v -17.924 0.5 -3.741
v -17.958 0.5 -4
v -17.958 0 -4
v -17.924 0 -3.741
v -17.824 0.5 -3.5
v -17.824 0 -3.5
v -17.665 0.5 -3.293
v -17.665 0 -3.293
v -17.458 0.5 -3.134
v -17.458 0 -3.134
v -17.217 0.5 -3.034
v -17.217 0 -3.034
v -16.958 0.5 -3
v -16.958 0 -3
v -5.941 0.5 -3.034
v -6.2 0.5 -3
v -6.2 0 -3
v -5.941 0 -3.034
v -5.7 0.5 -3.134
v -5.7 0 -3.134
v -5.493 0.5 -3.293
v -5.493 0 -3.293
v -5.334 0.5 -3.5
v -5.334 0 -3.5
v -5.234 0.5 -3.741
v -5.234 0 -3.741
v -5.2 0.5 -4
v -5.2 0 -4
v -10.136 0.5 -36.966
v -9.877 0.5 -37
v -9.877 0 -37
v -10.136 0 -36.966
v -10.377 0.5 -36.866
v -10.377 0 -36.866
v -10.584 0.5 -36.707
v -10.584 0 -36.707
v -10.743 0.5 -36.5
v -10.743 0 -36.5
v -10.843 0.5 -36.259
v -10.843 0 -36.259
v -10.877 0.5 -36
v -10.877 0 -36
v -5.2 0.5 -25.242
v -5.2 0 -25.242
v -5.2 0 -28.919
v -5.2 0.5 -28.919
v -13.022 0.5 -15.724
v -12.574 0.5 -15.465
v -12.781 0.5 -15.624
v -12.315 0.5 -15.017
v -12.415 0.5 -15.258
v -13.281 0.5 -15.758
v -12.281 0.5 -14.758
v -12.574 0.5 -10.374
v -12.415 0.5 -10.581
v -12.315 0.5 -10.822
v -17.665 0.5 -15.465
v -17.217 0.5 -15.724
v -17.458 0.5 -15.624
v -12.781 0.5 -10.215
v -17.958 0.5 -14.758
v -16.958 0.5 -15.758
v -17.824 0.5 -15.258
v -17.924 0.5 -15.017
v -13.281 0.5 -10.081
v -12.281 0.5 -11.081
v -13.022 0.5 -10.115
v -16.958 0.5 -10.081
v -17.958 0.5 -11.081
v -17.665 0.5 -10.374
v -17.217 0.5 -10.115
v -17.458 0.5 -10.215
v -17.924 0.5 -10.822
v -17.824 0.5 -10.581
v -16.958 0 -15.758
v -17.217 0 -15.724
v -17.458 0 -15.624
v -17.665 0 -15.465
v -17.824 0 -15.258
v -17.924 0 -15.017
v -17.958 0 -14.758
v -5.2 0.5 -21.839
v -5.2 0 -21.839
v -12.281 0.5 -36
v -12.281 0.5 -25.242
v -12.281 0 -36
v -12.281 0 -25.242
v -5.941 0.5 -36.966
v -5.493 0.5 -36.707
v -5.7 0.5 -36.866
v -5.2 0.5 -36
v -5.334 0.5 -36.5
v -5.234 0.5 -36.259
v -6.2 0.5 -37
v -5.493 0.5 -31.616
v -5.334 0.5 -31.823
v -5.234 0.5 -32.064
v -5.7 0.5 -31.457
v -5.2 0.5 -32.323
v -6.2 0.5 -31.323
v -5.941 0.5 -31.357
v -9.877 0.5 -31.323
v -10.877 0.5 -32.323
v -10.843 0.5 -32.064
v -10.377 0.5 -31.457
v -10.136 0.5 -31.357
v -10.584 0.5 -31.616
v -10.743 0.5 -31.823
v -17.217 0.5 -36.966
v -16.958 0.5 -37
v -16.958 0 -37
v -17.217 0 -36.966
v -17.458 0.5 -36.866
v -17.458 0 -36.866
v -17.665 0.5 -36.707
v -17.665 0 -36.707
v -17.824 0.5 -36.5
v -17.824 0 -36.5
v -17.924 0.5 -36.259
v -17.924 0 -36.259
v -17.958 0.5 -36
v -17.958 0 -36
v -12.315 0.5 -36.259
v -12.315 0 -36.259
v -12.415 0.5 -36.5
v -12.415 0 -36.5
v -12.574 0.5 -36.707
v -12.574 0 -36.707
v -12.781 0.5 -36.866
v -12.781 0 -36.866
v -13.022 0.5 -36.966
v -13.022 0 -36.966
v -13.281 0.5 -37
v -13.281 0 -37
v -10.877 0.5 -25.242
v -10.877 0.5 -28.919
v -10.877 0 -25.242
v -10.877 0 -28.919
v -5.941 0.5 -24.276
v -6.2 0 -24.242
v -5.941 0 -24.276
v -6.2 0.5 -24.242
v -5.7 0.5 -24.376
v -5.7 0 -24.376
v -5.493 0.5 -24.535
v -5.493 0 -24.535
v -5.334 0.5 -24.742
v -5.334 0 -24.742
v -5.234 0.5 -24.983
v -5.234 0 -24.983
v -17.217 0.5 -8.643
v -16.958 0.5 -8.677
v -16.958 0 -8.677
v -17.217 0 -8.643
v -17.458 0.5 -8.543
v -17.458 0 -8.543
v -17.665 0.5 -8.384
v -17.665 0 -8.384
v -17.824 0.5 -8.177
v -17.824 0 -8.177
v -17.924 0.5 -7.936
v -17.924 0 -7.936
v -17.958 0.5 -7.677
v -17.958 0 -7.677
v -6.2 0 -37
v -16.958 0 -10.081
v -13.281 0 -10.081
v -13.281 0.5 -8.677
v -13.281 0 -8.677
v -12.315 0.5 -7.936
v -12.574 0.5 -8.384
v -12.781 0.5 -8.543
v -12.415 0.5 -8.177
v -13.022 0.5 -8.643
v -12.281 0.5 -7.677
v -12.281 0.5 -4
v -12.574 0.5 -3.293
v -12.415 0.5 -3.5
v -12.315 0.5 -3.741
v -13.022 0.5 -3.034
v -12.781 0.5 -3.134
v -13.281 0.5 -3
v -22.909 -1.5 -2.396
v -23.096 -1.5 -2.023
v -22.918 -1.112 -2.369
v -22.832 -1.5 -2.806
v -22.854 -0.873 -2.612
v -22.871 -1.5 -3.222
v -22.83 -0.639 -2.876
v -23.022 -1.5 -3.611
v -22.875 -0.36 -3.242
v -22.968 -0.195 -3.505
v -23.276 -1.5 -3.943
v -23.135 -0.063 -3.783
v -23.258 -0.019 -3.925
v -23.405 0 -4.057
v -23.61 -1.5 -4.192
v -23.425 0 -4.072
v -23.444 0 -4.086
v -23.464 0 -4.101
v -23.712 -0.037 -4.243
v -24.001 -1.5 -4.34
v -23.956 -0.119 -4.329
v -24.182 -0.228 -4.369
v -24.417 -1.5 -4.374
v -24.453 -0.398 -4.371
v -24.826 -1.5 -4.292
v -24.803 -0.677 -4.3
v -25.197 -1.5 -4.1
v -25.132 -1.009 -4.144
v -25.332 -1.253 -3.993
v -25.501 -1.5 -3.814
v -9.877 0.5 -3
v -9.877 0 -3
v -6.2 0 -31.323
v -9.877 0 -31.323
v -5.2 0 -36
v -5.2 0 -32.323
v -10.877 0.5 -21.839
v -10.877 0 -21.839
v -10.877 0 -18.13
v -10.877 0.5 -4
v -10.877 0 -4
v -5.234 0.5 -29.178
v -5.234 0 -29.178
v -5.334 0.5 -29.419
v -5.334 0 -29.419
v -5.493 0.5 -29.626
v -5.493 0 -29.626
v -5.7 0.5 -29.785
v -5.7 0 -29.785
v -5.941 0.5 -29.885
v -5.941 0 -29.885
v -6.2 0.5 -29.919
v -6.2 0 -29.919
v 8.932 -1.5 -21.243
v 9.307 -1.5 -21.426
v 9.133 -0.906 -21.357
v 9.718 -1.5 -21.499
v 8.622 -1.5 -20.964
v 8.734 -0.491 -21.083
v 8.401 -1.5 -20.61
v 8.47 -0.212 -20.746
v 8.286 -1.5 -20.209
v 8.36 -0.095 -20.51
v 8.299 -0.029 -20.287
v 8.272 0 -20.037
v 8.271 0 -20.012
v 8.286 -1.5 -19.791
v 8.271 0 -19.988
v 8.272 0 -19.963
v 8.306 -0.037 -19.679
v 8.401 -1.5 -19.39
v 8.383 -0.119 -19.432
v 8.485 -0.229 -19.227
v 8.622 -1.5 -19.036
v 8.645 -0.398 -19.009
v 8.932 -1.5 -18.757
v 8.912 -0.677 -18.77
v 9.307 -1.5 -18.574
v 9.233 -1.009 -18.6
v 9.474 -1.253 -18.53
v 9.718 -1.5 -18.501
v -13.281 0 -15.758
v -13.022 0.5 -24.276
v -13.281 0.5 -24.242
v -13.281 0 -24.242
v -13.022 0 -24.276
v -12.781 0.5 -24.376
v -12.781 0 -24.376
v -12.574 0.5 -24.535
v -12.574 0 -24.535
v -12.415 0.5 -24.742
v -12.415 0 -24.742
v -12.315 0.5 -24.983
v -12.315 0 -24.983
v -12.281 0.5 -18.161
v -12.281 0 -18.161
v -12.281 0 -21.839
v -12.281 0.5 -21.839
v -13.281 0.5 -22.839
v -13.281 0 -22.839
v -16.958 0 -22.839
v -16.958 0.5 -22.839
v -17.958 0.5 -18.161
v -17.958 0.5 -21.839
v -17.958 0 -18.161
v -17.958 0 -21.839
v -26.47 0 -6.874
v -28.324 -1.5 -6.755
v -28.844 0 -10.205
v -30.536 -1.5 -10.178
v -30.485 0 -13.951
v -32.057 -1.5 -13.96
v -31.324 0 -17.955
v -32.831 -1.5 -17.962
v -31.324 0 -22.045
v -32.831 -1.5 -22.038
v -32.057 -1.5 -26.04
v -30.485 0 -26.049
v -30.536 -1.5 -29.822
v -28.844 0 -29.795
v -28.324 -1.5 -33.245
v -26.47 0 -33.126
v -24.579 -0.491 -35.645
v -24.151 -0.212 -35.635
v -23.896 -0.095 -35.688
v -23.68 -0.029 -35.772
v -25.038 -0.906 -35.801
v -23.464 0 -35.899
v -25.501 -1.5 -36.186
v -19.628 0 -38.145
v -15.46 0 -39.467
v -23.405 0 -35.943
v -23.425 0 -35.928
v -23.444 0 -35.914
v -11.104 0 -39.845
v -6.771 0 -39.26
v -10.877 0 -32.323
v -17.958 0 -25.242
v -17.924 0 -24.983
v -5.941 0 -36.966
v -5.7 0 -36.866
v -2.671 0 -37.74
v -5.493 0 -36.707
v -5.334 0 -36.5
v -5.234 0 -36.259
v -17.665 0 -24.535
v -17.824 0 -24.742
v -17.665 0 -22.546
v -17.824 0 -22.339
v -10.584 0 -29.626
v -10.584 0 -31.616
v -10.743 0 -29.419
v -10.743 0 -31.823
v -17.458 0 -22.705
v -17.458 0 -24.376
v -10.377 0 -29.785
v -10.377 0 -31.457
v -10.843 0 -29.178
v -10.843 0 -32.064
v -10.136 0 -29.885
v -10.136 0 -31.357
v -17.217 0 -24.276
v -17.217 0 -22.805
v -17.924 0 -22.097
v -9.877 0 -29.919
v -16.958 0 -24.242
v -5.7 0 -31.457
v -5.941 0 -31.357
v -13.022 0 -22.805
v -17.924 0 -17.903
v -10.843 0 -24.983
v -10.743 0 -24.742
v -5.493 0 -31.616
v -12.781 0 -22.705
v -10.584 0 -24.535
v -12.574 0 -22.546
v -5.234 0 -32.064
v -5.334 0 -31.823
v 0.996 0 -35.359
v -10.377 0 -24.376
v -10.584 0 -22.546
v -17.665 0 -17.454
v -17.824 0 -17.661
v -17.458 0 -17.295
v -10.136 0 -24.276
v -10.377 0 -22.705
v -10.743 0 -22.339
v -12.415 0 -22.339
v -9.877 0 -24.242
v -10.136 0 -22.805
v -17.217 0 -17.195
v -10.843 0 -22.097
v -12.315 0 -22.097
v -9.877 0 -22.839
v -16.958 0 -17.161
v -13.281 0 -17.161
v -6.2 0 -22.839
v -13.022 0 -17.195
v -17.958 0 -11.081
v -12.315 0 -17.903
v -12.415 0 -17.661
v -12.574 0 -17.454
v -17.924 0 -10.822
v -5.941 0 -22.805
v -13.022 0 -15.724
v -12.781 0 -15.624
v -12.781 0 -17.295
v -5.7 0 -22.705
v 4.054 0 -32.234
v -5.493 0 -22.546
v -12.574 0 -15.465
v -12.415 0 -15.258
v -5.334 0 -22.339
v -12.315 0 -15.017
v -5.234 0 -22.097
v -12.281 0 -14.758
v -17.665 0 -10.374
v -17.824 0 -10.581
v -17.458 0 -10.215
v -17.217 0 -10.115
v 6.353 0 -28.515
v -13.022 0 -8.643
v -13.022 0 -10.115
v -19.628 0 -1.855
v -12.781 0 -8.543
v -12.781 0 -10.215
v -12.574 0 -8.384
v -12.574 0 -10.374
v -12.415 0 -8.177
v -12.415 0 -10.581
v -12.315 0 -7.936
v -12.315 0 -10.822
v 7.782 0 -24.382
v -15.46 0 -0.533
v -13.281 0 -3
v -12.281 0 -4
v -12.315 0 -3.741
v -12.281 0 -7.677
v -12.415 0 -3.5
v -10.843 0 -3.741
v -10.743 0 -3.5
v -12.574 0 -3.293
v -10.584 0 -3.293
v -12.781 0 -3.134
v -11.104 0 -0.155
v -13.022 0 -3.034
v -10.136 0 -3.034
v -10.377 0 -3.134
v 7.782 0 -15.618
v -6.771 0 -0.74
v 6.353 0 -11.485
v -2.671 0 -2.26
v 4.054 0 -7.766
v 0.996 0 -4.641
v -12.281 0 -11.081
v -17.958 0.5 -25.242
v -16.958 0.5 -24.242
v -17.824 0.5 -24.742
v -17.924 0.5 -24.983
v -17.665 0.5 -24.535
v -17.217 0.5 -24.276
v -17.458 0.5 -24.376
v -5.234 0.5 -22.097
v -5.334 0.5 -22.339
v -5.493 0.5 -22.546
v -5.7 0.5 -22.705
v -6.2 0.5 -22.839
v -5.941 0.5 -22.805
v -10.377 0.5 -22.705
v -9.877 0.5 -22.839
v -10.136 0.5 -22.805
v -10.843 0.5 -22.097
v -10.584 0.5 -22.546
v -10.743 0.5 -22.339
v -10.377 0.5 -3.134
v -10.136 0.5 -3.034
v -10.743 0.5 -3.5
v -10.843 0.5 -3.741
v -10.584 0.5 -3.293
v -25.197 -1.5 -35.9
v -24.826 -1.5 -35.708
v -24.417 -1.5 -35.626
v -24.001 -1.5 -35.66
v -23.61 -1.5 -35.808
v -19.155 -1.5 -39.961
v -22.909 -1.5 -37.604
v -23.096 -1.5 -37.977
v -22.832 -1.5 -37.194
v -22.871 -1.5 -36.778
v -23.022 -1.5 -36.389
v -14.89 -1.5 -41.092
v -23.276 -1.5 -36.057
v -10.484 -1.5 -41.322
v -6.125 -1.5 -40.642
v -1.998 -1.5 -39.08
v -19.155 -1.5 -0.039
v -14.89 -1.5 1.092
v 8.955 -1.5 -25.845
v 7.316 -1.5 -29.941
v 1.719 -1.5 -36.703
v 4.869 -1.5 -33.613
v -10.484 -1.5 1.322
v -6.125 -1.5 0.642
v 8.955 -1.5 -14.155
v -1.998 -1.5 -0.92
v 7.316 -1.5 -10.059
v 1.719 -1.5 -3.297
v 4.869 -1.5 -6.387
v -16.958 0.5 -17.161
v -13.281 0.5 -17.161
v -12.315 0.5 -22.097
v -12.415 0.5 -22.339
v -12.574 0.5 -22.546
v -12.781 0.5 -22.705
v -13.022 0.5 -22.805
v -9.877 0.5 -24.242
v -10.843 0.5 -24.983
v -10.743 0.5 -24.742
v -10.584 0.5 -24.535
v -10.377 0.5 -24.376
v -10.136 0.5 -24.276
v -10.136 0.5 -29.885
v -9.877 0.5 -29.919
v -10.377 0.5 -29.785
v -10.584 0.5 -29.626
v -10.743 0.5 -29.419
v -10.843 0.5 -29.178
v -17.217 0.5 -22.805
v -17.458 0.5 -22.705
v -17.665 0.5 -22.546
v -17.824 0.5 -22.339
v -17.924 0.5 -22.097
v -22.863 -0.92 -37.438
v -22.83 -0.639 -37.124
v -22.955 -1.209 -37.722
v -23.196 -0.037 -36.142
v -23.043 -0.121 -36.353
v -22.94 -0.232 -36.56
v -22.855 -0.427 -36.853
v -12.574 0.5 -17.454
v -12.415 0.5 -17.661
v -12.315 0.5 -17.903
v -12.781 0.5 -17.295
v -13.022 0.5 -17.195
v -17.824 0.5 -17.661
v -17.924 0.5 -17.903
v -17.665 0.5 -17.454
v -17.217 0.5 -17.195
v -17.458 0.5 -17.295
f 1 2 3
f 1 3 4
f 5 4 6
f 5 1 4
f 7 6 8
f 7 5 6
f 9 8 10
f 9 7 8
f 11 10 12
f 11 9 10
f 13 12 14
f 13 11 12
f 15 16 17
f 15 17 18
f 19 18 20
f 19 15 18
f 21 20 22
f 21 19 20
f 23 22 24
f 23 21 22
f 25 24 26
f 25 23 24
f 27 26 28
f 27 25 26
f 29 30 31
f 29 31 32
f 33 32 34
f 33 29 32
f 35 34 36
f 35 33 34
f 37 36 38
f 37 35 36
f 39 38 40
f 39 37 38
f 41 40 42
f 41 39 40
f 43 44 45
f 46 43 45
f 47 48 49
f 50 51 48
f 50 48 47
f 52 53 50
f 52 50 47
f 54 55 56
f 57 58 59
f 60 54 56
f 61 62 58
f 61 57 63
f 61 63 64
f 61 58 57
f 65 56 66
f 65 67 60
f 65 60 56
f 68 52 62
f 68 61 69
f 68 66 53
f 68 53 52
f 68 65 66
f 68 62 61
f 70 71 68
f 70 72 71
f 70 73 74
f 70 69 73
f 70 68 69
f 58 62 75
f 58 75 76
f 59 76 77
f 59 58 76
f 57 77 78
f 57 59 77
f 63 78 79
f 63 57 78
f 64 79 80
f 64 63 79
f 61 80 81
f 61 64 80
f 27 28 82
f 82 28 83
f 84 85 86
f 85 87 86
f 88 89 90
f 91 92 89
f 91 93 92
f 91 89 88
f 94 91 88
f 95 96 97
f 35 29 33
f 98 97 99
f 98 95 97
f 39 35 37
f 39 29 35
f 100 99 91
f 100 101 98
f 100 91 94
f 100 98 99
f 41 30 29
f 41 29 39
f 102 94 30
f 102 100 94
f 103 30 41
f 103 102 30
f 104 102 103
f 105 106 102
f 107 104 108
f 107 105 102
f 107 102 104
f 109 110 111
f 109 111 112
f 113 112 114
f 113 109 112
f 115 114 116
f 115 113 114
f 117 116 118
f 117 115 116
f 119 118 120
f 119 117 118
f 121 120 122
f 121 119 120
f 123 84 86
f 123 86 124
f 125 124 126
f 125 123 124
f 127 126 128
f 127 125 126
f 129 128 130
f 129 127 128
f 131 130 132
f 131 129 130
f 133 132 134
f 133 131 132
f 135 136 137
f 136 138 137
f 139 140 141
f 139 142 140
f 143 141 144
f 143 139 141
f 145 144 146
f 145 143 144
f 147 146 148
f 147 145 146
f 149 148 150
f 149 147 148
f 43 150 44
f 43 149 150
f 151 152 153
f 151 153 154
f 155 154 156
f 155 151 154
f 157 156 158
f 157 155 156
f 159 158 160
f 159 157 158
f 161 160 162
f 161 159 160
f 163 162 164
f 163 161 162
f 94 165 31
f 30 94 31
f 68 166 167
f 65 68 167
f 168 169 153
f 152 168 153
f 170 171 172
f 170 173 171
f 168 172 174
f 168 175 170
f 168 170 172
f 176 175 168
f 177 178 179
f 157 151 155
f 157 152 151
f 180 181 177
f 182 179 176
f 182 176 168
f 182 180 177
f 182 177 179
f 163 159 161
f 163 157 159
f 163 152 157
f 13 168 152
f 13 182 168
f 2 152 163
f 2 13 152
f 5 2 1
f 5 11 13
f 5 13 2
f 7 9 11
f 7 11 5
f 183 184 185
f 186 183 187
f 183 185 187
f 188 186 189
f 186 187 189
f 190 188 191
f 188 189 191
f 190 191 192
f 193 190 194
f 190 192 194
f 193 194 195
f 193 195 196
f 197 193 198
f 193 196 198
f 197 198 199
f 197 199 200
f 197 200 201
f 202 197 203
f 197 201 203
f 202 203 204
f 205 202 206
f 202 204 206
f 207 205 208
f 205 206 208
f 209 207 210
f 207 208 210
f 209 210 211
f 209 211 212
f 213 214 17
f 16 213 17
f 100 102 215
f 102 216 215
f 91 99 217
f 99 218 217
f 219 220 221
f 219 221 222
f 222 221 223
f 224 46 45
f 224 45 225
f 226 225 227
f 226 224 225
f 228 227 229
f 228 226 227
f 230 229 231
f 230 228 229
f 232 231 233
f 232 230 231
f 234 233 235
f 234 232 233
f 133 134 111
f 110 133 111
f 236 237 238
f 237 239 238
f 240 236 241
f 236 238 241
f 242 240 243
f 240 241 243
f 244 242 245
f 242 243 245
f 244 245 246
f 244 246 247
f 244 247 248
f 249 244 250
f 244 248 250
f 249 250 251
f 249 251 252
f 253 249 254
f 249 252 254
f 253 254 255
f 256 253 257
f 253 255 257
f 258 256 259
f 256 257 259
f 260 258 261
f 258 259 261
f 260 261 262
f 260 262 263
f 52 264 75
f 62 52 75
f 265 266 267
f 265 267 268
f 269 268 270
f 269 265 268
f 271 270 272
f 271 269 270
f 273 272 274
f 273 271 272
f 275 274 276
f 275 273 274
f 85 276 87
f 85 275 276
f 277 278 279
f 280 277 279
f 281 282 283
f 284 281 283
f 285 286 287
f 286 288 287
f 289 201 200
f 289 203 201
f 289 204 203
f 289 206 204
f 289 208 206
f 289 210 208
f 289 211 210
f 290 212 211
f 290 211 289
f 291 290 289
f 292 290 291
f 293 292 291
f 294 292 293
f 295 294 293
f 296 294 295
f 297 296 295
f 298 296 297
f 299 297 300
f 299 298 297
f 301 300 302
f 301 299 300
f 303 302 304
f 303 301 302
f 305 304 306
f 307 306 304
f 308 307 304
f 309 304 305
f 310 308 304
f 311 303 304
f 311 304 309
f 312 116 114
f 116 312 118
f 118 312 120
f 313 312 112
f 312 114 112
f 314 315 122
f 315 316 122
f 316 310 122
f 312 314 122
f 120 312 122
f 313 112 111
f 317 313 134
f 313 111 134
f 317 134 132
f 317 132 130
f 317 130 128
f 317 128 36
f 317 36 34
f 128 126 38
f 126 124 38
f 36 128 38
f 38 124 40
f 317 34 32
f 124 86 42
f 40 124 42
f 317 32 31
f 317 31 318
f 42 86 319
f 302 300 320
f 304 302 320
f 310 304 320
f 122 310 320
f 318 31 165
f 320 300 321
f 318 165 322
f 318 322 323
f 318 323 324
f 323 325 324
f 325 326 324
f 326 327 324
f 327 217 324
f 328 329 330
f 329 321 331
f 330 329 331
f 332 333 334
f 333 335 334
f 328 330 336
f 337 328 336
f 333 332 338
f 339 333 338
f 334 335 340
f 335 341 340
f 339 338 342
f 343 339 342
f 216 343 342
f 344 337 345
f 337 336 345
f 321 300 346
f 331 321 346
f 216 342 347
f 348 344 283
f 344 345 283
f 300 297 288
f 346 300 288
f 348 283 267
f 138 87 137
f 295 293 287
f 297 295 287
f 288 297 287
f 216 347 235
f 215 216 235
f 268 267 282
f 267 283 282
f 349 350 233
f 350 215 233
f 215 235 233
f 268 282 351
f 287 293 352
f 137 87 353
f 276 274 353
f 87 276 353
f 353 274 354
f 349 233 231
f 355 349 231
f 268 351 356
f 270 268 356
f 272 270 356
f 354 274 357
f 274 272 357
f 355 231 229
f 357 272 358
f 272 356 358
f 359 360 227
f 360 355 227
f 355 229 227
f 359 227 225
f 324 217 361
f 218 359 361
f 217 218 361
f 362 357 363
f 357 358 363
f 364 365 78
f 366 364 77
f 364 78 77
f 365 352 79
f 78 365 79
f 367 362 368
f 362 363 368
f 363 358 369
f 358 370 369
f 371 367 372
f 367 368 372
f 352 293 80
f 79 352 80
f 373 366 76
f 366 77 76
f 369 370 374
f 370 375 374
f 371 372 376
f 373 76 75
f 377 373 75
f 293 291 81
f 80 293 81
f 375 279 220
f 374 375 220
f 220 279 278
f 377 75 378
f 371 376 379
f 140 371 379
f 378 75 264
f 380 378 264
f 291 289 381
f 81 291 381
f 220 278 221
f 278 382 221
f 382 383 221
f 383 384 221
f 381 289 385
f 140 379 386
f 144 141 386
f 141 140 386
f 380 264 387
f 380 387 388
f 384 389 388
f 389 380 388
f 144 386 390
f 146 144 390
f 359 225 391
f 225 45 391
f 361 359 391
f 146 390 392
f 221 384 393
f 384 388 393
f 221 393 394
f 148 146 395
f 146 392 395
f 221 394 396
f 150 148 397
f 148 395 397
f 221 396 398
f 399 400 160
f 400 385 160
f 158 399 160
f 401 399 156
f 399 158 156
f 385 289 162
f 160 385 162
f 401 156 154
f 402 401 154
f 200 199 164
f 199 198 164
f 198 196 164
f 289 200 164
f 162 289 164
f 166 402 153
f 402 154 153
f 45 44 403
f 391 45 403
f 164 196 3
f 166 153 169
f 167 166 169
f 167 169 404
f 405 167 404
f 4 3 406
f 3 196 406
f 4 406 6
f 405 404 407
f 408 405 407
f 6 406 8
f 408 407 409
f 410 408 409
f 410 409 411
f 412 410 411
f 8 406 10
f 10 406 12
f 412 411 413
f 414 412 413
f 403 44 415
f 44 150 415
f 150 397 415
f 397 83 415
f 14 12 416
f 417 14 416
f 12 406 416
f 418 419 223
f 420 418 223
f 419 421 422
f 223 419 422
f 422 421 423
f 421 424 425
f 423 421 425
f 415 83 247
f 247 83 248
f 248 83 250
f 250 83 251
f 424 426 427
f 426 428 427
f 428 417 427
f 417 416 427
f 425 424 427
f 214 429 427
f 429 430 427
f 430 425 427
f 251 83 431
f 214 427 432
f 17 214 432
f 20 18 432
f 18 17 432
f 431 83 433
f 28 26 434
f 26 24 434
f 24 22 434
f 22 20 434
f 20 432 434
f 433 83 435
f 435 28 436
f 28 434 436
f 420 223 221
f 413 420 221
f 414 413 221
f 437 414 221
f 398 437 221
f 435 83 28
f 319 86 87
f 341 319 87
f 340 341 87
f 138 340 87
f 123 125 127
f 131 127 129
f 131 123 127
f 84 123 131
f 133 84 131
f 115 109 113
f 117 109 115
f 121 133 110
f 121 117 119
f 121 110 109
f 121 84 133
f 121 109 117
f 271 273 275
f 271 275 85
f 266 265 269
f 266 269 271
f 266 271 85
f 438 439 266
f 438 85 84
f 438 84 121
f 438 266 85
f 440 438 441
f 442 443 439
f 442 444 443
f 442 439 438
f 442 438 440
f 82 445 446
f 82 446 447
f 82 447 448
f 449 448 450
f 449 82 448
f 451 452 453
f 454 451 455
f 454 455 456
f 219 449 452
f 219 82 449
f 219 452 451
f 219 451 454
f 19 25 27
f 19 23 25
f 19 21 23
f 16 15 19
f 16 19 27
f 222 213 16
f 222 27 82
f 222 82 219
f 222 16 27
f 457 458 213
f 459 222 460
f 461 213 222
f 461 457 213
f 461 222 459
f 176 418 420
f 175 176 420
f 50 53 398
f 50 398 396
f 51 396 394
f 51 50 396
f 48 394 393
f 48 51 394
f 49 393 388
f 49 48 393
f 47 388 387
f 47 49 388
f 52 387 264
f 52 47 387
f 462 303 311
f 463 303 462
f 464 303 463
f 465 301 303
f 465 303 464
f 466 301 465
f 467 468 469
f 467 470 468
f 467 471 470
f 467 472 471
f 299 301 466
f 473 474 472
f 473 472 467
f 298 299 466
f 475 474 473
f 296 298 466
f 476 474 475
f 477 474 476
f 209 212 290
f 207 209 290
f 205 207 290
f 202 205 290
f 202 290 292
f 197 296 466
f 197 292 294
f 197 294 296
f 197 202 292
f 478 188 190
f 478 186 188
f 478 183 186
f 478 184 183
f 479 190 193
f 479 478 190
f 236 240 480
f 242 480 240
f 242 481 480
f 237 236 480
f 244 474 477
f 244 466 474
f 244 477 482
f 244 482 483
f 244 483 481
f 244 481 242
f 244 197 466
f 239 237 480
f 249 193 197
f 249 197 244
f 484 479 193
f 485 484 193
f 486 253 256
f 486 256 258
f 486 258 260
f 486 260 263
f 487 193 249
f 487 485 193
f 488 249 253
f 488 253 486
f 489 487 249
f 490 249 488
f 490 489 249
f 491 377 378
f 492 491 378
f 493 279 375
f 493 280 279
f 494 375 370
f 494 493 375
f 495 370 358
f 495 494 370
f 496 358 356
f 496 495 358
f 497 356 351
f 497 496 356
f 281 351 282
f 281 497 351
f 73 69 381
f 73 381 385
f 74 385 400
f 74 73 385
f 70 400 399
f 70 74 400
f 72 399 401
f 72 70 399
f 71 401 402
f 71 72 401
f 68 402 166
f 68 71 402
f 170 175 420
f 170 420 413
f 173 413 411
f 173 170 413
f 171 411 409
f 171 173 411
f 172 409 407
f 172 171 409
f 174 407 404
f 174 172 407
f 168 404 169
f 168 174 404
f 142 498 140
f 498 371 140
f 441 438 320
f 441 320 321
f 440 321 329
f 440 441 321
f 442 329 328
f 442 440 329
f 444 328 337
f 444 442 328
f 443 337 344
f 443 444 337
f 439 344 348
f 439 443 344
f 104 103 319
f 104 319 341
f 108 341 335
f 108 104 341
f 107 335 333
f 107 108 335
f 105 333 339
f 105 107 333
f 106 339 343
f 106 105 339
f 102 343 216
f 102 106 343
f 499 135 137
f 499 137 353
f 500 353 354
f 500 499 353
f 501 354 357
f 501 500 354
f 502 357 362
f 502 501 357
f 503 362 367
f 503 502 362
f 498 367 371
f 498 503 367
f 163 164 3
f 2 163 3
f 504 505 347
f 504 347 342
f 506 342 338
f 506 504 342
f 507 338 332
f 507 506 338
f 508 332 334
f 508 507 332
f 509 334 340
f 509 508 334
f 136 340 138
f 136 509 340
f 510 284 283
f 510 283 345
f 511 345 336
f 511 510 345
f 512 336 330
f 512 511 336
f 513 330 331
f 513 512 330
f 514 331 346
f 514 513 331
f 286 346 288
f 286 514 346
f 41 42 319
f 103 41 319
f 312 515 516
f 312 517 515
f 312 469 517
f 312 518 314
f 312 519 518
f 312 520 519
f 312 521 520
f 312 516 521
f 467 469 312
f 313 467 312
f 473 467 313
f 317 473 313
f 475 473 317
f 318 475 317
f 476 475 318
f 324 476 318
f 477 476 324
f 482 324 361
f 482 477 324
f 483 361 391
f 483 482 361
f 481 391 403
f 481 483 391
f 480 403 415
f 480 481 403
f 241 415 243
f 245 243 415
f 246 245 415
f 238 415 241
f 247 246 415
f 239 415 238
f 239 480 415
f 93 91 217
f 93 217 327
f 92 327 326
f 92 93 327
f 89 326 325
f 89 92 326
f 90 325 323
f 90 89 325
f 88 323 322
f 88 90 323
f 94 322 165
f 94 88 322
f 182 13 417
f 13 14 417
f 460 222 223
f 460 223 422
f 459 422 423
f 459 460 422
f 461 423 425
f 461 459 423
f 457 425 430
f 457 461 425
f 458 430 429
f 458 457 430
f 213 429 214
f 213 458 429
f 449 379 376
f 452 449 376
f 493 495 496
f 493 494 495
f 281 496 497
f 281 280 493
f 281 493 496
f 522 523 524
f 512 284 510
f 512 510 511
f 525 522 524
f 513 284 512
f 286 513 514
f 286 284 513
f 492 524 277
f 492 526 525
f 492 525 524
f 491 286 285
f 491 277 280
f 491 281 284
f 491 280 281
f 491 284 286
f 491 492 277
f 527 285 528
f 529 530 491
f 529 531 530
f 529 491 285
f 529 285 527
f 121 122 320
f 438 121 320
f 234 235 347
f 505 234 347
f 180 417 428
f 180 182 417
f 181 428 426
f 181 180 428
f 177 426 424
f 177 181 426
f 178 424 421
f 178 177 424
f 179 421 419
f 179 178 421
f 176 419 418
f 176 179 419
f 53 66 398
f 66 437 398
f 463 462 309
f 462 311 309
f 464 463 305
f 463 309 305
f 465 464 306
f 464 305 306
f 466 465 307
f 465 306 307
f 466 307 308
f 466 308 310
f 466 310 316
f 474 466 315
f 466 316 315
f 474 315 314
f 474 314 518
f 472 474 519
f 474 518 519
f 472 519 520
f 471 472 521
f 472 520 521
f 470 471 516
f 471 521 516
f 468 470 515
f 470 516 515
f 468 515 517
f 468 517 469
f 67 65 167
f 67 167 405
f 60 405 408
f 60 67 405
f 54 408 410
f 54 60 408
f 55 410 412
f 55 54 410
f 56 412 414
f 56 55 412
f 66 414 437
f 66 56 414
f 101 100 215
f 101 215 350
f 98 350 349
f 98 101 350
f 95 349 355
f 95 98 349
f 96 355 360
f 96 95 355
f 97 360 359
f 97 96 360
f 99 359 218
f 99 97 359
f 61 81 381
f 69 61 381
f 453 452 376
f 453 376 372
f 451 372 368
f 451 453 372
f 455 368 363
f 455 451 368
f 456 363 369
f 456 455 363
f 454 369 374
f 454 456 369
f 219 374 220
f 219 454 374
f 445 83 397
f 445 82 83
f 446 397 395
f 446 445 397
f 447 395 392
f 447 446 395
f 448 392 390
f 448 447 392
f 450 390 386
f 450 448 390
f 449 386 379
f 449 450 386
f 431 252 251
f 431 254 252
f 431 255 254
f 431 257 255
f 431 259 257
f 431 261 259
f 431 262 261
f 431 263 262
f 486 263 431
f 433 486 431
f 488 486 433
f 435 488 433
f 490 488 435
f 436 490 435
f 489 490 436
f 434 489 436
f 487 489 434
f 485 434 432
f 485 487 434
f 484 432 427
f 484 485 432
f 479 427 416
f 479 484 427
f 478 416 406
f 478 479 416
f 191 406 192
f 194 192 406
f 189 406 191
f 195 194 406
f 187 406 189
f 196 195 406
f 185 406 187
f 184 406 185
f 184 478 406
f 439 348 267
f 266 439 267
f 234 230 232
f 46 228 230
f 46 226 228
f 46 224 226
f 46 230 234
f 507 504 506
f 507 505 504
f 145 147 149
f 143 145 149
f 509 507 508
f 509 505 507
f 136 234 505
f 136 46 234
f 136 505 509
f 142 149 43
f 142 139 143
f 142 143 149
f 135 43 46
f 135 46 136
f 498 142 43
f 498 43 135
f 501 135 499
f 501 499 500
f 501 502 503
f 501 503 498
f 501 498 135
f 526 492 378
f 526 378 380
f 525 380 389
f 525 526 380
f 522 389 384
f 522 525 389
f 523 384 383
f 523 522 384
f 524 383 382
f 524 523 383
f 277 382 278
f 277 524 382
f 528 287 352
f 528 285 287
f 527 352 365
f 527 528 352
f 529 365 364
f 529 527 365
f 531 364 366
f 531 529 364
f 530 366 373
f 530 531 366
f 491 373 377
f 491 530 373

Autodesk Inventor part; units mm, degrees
ref_plane "YZ Plane" through (0, 0, 0) normal (1, 0, 0) x (0, 1, 0)
ref_plane "XZ Plane" through (0, 0, 0) normal (0, 1, 0) x (-1, 0, 0)
ref_plane "XY Plane" through (0, 0, 0) normal (0, 0, 1) x (1, 0, 0)
sketch "Эскиз1" plane through (0, 0, 0) normal (0, 1, 0) x (-1, 0, 0)
  line L0 (0, 0) -> (23.1579, 0)
  line L1 (23.1579, 0) -> (23.1579, -40)
  line L2 (23.1579, -40) -> (0, -40)
  line L3 (0, -40) -> (0, 0)
  line L4 (17.9579, -3) -> (12.2807, -3)
  line L5 (12.2807, -3) -> (12.2807, -8.6772)
  line L6 (12.2807, -8.6772) -> (17.9579, -8.6772)
  line L7 (17.9579, -8.6772) -> (17.9579, -3)
  line L8 (17.9579, -10.0807) -> (12.2807, -10.0807)
  line L9 (12.2807, -10.0807) -> (12.2807, -15.7579)
  line L10 (12.2807, -15.7579) -> (17.9579, -15.7579)
  line L11 (17.9579, -15.7579) -> (17.9579, -10.0807)
  line L12 (17.9579, -17.1614) -> (12.2807, -17.1614)
  line L13 (12.2807, -17.1614) -> (12.2807, -22.8386)
  line L14 (12.2807, -22.8386) -> (17.9579, -22.8386)
  line L15 (17.9579, -22.8386) -> (17.9579, -17.1614)
  line L16 (17.9579, -24.2421) -> (12.2807, -24.2421)
  line L17 (12.2807, -24.2421) -> (12.2807, -37)
  line L18 (12.2807, -37) -> (17.9579, -37)
  line L19 (17.9579, -37) -> (17.9579, -24.2421)
  line L20 (10.8772, -24.2421) -> (5.2, -24.2421)
  line L21 (5.2, -24.2421) -> (5.2, -29.9193)
  line L22 (5.2, -29.9193) -> (10.8772, -29.9193)
  line L23 (10.8772, -29.9193) -> (10.8772, -24.2421)
  line L24 (10.8772, -31.3228) -> (5.2, -31.3228)
  line L25 (5.2, -31.3228) -> (5.2, -37)
  line L26 (5.2, -37) -> (10.8772, -37)
  line L27 (10.8772, -37) -> (10.8772, -31.3228)
  line L28 (10.8772, -3) -> (5.2, -3)
  line L29 (5.2, -3) -> (5.2, -22.8386)
  line L30 (5.2, -22.8386) -> (10.8772, -22.8386)
  line L31 (10.8772, -22.8386) -> (10.8772, -3)
  line L32 (15.1193, -8.6772) -> (15.1193, -10.0807)
  line L33 (15.1193, -15.7579) -> (15.1193, -17.1614)
  line L34 (15.1193, -22.8386) -> (15.1193, -24.2421)
  line L35 (8.0386, -22.8386) -> (8.0386, -24.2421)
  line L36 (8.0386, -29.9193) -> (8.0386, -31.3228)
  line L37 (15.1193, -3) -> (15.1193, 0)
  line L38 (15.1193, -37) -> (15.1193, -40)
  line L39 (17.9579, -12.9193) -> (23.1579, -12.9193)
  line L40 (5.2, -12.9193) -> (0, -12.9193)
  line L41 (12.2807, -12.9193) -> (10.8772, -12.9193)
  dimension "d0" = 23.1579
  dimension "d1" = 40
  dimension "d9" = 5.2
  dimension "d21" = 3
extrude "Выдавливание1" add sketch "Эскиз1" along normal blind 0.5 contours L24 L27 L26 L25 | L20 L23 L22 L21 | L4 L7 L6 L5 | L29 L28 L31 L30 | L11 L10 L9 L8 | L18 L17 L16 L19 | L12 L15 L14 L13
sketch "Эскиз2" plane through (0, 0, 0) normal (0, -1, 0) x (1, 0, 0)
  line L0 (-5.2, -22.8386) -> (-10.8772, -22.8386) projected
  line L1 (-10.8772, -22.8386) -> (-10.8772, -3) projected
  line L2 (-10.8772, -3) -> (-5.2, -3) projected
  line L3 (-5.2, -3) -> (-5.2, -22.8386) projected
  line L4 (-5.2, -31.3228) -> (-5.2, -37) projected
  line L5 (-5.2, -37) -> (-10.8772, -37) projected
  line L6 (-10.8772, -37) -> (-10.8772, -31.3228) projected
  line L7 (-10.8772, -31.3228) -> (-5.2, -31.3228) projected
  line L8 (-17.9579, -17.1614) -> (-12.2807, -17.1614) projected
  line L9 (-12.2807, -22.8386) -> (-17.9579, -22.8386) projected
  line L10 (-17.9579, -22.8386) -> (-17.9579, -17.1614) projected
  line L11 (-17.9579, -37) -> (-17.9579, -24.2421) projected
  line L12 (-17.9579, -24.2421) -> (-12.2807, -24.2421) projected
  line L13 (-12.2807, -37) -> (-17.9579, -37) projected
  line L14 (-12.2807, -15.7579) -> (-17.9579, -15.7579) projected
  line L15 (-17.9579, -15.7579) -> (-17.9579, -10.0807) projected
  line L16 (-17.9579, -10.0807) -> (-12.2807, -10.0807) projected
  line L17 (-17.9579, -8.6772) -> (-17.9579, -3) projected
  line L18 (-17.9579, -3) -> (-12.2807, -3) projected
  line L19 (-12.2807, -8.6772) -> (-17.9579, -8.6772) projected
  line L20 (-5.2, -24.2421) -> (-5.2, -29.9193) projected
  line L21 (-5.2, -29.9193) -> (-10.8772, -29.9193) projected
  line L22 (-10.8772, -29.9193) -> (-10.8772, -24.2421) projected
  line L23 (-10.8772, -24.2421) -> (-5.2, -24.2421) projected
  line L24 (-12.2807, -17.1614) -> (-12.2807, -22.8386) projected
  line L25 (-12.2807, -24.2421) -> (-12.2807, -37) projected
  line L26 (-12.2807, -10.0807) -> (-12.2807, -15.7579) projected
  line L27 (-12.2807, -3) -> (-12.2807, -8.6772) projected
  line L28 (-10.8772, -3) -> (-5.2, -3) projected
  line L29 (-17.9579, -37) -> (-5.2, -3)
  circle A0 centre (-11.5789, -20) radius 21.35
  dimension "d24" = 42.7
extrude "Выдавливание2" add sketch "Эскиз2" along normal blind 1.5 contours L12 L25 L13 L29 | L29 L11 L12 | L24 L9 L29 | L29 L9 L10 L8 L24 | L0 L1 L29 L3 | L29 L1 L2 | L4 L5 L6 L7 | L14 L15 L16 L26 | L17 L18 L27 L19 | L20 L21 L22 L23 | A0
fillet "Сопряжение1" radius 1 28 edges at (-17.9579, 0.25, -3) (-17.9579, 0.25, -8.6772) (-12.2807, 0.25, -3) (-12.2807, 0.25, -8.6772) (-17.9579, 0.25, -15.7579) (-17.9579, 0.25, -10.0807) (-12.2807, 0.25, -10.0807) (-12.2807, 0.25, -15.7579) (-12.2807, 0.25, -22.8386) (-5.2, 0.25, -29.9193) (-5.2, 0.25, -22.8386) (-5.2, 0.25, -37) (-17.9579, 0.25, -22.8386) (-17.9579, 0.25, -37) (-10.8772, 0.25, -22.8386) (-10.8772, 0.25, -29.9193) (-10.8772, 0.25, -37) (-17.9579, 0.25, -24.2421) (-10.8772, 0.25, -3) (-12.2807, 0.25, -24.2421) (-5.2, 0.25, -24.2421) (-5.2, 0.25, -3) (-10.8772, 0.25, -24.2421) (-17.9579, 0.25, -17.1614) (-12.2807, 0.25, -17.1614) (-12.2807, 0.25, -37) (-10.8772, 0.25, -31.3228) (-5.2, 0.25, -31.3228)
chamfer "Фаска1" distance 1.5 angle 45 1 edges at (-32.9289, 0, -20)
sketch "Эскиз5" plane through (-11.5789, 0, -20) normal (0, 1, 0) x (1, 0, 0)
  circle A0 centre (0, 0) radius 19.85 projected
  circle A1 centre (0, 0) radius 21.35 projected
  circle A2 centre (21.35, 0) radius 1.5
  circle A3 centre (-12.7513, 17.1239) radius 1.5
  circle A4 centre (-12.7513, -17.1239) radius 1.5
  line L0 (28, 0) -> (-19.5959, 20)
  line L1 (28, 0) -> (-19.5959, -20)
  line L2 (-19.5959, 20) -> (-19.5959, -20)
  line L3 (0, 0) -> (-19.5959, 20)
  line L4 (0, 0) -> (-19.5959, -20)
  line L5 (28, 0) -> (0, 0)
  point P0 (11.5789, -20)
  dimension "d28" = 40
  dimension "d29" = 28
extrude "Выдавливание5" cut sketch "Эскиз5" against normal blind 1.5 contours L5 A1 A2 | A2 A1 L5 | A2 L5 A1 | A1 L5 A2 | A3 A1 L0 | L0 A1 A3 | A1 L0 A3 | A4 L1 A1 | A4 A1 L1 | A4 L1 A1 | A3 L0 A1 | A1 L1 A4
equation "\"d0\" = 0.578947 * d1"
properties part number "Лого ШП"
